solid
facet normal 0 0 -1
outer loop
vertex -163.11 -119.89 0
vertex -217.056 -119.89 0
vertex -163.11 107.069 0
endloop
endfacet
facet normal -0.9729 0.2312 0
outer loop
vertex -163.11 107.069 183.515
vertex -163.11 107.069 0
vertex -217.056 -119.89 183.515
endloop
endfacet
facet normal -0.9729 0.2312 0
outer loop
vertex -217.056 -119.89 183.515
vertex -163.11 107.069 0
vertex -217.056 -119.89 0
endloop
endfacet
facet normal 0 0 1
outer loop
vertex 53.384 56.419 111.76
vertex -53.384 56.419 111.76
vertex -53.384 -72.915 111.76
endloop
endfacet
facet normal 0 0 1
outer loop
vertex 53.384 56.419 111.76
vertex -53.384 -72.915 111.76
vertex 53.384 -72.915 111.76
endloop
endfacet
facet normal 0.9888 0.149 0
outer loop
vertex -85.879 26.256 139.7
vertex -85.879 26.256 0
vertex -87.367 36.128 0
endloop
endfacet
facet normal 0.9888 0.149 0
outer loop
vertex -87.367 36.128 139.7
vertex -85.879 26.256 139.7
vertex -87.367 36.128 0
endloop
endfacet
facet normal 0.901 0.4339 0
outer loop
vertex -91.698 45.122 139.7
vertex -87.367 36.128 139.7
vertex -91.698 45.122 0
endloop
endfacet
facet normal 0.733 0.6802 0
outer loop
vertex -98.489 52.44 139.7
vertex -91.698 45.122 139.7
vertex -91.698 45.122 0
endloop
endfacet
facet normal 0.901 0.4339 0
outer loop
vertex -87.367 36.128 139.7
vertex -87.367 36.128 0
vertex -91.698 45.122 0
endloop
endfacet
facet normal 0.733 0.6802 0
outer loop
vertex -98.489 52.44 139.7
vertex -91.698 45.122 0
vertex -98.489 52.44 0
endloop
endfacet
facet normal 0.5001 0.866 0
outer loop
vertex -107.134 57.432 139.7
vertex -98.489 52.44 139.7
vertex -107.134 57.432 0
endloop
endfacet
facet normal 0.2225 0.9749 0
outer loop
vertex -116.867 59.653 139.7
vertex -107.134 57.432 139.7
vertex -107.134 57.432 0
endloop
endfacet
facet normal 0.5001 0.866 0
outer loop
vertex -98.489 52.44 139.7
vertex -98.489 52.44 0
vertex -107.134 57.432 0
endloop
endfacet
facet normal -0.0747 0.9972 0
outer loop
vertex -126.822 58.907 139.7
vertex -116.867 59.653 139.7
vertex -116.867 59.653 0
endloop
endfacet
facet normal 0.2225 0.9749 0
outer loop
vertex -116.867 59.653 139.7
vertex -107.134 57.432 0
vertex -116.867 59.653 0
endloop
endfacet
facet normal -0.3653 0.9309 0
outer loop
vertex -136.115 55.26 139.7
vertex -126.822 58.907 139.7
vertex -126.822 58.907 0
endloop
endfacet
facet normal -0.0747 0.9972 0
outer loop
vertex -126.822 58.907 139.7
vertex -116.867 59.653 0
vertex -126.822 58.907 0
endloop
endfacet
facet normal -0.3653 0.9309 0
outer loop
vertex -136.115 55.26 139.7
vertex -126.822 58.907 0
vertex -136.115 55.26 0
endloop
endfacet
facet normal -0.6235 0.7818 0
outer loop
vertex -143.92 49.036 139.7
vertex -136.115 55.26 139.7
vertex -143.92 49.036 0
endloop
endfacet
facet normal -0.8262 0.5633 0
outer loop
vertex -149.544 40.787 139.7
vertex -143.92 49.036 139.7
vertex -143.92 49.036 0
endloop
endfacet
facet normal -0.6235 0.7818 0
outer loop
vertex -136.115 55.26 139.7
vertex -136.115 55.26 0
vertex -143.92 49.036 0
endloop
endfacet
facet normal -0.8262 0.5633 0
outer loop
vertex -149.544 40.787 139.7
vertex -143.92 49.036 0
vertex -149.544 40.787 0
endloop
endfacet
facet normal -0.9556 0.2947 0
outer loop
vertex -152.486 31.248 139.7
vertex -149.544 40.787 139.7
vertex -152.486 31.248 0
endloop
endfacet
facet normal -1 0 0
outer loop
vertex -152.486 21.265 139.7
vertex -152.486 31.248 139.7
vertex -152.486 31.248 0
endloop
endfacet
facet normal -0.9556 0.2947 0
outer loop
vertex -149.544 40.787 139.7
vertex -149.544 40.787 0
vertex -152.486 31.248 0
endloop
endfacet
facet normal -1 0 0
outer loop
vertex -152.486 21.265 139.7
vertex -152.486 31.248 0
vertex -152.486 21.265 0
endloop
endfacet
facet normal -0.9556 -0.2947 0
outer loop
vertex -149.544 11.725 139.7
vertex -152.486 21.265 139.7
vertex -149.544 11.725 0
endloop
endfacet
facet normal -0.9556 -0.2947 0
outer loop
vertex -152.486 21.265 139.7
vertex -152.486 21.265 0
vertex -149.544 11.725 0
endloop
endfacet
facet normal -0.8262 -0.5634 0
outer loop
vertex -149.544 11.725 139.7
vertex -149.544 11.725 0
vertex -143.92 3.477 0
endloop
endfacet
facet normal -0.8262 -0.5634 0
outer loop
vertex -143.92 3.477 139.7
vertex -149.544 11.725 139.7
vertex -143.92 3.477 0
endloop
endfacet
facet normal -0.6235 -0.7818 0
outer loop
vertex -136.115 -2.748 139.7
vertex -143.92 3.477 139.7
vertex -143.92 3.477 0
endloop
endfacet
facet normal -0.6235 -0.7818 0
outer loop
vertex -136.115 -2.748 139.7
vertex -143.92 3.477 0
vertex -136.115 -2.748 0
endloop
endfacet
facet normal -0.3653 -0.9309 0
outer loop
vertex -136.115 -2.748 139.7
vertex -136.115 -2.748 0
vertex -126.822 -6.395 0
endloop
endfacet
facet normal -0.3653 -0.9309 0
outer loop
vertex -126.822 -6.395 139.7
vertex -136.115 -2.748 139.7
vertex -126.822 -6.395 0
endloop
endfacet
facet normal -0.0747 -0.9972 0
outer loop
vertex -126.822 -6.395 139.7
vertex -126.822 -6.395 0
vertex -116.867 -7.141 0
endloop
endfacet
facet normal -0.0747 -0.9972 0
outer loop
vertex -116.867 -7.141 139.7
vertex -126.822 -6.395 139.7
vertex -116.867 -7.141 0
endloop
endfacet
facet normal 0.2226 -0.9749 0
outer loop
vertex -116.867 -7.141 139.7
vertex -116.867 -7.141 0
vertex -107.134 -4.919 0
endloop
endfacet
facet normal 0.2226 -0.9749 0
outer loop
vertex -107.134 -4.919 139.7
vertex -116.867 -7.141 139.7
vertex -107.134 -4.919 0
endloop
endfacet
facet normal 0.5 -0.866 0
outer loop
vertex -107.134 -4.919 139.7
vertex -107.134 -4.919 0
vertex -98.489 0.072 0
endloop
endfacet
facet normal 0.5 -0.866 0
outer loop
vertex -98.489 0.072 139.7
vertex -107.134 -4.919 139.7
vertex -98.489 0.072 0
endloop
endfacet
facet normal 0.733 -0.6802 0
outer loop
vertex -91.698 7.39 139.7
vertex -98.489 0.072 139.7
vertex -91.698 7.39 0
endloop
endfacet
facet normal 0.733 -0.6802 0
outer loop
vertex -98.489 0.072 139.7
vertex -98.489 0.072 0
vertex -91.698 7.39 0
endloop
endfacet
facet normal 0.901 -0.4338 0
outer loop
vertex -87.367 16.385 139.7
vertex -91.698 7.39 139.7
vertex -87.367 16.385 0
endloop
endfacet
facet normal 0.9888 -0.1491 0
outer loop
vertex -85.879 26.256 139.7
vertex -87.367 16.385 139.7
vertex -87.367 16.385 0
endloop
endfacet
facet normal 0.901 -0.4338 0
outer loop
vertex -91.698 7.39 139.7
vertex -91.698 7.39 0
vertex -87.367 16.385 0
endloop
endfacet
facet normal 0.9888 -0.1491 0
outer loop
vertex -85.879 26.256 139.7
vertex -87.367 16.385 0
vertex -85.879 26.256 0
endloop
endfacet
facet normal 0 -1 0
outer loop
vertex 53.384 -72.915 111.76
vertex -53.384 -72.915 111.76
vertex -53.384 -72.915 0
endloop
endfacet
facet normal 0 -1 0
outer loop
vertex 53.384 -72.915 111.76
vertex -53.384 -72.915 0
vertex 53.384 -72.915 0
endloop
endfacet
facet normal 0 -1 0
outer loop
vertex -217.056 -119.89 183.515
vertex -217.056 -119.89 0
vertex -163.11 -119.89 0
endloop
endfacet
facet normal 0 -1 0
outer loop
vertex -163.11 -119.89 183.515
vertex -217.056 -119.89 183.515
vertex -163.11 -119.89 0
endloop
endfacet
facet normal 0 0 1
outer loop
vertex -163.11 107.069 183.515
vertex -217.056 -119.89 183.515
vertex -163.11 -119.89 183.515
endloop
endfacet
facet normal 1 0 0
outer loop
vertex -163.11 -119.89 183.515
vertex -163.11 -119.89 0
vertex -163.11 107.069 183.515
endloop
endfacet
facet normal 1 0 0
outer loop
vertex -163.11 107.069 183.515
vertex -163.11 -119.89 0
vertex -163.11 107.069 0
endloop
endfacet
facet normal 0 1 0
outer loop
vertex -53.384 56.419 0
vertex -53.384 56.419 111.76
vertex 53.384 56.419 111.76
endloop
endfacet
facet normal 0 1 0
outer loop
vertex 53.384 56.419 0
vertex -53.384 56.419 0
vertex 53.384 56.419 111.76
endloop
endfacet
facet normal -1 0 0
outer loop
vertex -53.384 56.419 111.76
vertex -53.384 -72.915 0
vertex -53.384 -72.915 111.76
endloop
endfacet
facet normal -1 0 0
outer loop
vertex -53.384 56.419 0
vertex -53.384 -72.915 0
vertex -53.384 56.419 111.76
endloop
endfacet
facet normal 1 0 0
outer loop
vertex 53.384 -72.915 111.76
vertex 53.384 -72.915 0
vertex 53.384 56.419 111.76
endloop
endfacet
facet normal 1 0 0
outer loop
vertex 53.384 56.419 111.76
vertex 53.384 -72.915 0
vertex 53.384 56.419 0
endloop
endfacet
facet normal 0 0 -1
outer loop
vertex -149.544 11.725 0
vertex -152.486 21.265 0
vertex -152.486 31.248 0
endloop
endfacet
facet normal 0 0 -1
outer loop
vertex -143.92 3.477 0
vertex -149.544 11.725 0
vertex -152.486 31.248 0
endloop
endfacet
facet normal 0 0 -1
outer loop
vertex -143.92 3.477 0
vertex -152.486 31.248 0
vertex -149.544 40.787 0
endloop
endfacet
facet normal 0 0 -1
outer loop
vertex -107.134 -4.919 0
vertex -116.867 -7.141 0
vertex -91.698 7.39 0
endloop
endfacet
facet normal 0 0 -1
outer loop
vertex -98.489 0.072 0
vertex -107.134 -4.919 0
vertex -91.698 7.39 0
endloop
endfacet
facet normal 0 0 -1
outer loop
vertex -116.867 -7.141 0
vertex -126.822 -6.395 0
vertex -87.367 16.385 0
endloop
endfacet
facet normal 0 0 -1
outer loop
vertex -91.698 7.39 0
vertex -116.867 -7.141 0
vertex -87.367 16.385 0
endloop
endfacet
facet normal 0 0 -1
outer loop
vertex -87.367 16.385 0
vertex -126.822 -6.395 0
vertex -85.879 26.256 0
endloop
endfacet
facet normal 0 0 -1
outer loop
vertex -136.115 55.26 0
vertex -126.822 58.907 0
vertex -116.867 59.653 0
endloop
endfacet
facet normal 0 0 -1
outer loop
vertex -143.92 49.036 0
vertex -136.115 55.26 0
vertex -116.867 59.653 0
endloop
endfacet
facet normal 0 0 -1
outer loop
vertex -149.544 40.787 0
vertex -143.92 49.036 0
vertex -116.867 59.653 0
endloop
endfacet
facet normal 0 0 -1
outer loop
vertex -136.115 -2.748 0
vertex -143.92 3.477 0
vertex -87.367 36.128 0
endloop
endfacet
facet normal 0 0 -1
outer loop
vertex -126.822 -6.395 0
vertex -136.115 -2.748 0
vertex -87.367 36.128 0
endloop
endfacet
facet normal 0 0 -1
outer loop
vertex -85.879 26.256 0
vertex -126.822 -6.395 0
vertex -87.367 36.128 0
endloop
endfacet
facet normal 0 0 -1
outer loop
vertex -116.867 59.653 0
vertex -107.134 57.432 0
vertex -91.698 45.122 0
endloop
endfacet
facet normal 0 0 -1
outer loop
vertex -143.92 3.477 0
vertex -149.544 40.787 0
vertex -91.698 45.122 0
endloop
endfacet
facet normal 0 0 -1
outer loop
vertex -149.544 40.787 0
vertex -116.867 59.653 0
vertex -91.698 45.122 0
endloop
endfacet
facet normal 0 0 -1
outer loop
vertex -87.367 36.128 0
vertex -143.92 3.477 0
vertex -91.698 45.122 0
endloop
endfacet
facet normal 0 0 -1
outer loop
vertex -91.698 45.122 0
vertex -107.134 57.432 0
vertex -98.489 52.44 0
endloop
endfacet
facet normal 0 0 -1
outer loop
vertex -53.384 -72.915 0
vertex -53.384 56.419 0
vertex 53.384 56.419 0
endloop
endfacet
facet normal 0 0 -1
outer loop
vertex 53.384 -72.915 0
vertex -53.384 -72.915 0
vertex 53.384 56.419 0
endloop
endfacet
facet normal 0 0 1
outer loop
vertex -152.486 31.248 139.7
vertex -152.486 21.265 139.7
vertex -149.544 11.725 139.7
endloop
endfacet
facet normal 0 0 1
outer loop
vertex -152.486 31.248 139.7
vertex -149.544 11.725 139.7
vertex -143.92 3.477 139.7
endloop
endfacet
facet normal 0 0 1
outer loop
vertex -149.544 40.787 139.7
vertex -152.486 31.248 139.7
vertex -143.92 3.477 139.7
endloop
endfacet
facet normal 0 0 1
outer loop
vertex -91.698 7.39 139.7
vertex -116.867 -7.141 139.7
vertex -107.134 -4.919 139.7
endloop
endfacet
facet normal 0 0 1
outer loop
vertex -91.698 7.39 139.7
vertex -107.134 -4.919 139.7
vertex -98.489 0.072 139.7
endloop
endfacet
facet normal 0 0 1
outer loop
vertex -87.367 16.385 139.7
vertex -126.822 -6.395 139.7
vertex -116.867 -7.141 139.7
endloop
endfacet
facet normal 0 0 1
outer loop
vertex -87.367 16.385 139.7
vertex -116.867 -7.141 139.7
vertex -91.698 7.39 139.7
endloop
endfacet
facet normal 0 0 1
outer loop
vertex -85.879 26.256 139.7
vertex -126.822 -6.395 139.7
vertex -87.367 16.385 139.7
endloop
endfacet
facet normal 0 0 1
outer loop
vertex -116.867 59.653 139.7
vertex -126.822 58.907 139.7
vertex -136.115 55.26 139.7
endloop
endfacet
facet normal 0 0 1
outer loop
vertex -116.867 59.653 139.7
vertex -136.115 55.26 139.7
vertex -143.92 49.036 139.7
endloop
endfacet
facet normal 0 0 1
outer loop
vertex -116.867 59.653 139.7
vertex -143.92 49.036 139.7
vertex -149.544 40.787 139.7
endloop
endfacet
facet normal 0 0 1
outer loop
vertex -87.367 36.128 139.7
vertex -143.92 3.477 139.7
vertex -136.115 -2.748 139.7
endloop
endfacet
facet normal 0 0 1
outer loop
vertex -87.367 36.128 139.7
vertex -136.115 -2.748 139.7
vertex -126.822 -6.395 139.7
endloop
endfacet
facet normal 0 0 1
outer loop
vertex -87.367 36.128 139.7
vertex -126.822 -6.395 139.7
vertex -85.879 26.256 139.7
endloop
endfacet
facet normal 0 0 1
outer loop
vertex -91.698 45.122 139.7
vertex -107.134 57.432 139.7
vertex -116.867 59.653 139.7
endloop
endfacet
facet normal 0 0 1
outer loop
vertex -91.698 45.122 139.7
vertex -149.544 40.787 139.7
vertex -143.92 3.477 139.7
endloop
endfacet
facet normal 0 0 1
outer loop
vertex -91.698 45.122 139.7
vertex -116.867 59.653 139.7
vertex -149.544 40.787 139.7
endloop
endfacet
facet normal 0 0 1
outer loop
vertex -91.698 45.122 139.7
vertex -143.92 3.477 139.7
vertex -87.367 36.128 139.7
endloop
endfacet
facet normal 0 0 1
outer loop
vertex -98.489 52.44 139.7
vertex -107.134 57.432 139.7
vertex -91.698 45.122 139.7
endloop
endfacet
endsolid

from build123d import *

# Parameters (mm, degrees)
F0_W     = 106.768228
F0_H     = 129.3335
F1_DEPTH = 111.76
F2_R     = 33.490648
F3_DEPTH = 139.7
F5_DEPTH = 183.515


with BuildPart() as f1:
    # F0 (on Top) → F1 (new body)
    with BuildSketch(Plane.XY):
        with Locations((0, -8.248193)):
            Rectangle(F0_W, F0_H)
    extrude(amount=F1_DEPTH)


with BuildPart() as f3:
    # F2 (on Top) → F3 (new body)
    with BuildSketch(Plane.XY):
        with Locations((-119.369633, 26.256129)):
            Circle(F2_R)
    extrude(amount=F3_DEPTH)


with BuildPart() as f5:
    # F4 (on Top) → F5 (new body)
    with BuildSketch(Plane.XY):
        Polygon((-163.109899, -119.890295), (-163.109899, 107.068837), (-217.055589, -119.890295), align=None)
    extrude(amount=F5_DEPTH)


solid = Compound([f1.part, f3.part, f5.part])
